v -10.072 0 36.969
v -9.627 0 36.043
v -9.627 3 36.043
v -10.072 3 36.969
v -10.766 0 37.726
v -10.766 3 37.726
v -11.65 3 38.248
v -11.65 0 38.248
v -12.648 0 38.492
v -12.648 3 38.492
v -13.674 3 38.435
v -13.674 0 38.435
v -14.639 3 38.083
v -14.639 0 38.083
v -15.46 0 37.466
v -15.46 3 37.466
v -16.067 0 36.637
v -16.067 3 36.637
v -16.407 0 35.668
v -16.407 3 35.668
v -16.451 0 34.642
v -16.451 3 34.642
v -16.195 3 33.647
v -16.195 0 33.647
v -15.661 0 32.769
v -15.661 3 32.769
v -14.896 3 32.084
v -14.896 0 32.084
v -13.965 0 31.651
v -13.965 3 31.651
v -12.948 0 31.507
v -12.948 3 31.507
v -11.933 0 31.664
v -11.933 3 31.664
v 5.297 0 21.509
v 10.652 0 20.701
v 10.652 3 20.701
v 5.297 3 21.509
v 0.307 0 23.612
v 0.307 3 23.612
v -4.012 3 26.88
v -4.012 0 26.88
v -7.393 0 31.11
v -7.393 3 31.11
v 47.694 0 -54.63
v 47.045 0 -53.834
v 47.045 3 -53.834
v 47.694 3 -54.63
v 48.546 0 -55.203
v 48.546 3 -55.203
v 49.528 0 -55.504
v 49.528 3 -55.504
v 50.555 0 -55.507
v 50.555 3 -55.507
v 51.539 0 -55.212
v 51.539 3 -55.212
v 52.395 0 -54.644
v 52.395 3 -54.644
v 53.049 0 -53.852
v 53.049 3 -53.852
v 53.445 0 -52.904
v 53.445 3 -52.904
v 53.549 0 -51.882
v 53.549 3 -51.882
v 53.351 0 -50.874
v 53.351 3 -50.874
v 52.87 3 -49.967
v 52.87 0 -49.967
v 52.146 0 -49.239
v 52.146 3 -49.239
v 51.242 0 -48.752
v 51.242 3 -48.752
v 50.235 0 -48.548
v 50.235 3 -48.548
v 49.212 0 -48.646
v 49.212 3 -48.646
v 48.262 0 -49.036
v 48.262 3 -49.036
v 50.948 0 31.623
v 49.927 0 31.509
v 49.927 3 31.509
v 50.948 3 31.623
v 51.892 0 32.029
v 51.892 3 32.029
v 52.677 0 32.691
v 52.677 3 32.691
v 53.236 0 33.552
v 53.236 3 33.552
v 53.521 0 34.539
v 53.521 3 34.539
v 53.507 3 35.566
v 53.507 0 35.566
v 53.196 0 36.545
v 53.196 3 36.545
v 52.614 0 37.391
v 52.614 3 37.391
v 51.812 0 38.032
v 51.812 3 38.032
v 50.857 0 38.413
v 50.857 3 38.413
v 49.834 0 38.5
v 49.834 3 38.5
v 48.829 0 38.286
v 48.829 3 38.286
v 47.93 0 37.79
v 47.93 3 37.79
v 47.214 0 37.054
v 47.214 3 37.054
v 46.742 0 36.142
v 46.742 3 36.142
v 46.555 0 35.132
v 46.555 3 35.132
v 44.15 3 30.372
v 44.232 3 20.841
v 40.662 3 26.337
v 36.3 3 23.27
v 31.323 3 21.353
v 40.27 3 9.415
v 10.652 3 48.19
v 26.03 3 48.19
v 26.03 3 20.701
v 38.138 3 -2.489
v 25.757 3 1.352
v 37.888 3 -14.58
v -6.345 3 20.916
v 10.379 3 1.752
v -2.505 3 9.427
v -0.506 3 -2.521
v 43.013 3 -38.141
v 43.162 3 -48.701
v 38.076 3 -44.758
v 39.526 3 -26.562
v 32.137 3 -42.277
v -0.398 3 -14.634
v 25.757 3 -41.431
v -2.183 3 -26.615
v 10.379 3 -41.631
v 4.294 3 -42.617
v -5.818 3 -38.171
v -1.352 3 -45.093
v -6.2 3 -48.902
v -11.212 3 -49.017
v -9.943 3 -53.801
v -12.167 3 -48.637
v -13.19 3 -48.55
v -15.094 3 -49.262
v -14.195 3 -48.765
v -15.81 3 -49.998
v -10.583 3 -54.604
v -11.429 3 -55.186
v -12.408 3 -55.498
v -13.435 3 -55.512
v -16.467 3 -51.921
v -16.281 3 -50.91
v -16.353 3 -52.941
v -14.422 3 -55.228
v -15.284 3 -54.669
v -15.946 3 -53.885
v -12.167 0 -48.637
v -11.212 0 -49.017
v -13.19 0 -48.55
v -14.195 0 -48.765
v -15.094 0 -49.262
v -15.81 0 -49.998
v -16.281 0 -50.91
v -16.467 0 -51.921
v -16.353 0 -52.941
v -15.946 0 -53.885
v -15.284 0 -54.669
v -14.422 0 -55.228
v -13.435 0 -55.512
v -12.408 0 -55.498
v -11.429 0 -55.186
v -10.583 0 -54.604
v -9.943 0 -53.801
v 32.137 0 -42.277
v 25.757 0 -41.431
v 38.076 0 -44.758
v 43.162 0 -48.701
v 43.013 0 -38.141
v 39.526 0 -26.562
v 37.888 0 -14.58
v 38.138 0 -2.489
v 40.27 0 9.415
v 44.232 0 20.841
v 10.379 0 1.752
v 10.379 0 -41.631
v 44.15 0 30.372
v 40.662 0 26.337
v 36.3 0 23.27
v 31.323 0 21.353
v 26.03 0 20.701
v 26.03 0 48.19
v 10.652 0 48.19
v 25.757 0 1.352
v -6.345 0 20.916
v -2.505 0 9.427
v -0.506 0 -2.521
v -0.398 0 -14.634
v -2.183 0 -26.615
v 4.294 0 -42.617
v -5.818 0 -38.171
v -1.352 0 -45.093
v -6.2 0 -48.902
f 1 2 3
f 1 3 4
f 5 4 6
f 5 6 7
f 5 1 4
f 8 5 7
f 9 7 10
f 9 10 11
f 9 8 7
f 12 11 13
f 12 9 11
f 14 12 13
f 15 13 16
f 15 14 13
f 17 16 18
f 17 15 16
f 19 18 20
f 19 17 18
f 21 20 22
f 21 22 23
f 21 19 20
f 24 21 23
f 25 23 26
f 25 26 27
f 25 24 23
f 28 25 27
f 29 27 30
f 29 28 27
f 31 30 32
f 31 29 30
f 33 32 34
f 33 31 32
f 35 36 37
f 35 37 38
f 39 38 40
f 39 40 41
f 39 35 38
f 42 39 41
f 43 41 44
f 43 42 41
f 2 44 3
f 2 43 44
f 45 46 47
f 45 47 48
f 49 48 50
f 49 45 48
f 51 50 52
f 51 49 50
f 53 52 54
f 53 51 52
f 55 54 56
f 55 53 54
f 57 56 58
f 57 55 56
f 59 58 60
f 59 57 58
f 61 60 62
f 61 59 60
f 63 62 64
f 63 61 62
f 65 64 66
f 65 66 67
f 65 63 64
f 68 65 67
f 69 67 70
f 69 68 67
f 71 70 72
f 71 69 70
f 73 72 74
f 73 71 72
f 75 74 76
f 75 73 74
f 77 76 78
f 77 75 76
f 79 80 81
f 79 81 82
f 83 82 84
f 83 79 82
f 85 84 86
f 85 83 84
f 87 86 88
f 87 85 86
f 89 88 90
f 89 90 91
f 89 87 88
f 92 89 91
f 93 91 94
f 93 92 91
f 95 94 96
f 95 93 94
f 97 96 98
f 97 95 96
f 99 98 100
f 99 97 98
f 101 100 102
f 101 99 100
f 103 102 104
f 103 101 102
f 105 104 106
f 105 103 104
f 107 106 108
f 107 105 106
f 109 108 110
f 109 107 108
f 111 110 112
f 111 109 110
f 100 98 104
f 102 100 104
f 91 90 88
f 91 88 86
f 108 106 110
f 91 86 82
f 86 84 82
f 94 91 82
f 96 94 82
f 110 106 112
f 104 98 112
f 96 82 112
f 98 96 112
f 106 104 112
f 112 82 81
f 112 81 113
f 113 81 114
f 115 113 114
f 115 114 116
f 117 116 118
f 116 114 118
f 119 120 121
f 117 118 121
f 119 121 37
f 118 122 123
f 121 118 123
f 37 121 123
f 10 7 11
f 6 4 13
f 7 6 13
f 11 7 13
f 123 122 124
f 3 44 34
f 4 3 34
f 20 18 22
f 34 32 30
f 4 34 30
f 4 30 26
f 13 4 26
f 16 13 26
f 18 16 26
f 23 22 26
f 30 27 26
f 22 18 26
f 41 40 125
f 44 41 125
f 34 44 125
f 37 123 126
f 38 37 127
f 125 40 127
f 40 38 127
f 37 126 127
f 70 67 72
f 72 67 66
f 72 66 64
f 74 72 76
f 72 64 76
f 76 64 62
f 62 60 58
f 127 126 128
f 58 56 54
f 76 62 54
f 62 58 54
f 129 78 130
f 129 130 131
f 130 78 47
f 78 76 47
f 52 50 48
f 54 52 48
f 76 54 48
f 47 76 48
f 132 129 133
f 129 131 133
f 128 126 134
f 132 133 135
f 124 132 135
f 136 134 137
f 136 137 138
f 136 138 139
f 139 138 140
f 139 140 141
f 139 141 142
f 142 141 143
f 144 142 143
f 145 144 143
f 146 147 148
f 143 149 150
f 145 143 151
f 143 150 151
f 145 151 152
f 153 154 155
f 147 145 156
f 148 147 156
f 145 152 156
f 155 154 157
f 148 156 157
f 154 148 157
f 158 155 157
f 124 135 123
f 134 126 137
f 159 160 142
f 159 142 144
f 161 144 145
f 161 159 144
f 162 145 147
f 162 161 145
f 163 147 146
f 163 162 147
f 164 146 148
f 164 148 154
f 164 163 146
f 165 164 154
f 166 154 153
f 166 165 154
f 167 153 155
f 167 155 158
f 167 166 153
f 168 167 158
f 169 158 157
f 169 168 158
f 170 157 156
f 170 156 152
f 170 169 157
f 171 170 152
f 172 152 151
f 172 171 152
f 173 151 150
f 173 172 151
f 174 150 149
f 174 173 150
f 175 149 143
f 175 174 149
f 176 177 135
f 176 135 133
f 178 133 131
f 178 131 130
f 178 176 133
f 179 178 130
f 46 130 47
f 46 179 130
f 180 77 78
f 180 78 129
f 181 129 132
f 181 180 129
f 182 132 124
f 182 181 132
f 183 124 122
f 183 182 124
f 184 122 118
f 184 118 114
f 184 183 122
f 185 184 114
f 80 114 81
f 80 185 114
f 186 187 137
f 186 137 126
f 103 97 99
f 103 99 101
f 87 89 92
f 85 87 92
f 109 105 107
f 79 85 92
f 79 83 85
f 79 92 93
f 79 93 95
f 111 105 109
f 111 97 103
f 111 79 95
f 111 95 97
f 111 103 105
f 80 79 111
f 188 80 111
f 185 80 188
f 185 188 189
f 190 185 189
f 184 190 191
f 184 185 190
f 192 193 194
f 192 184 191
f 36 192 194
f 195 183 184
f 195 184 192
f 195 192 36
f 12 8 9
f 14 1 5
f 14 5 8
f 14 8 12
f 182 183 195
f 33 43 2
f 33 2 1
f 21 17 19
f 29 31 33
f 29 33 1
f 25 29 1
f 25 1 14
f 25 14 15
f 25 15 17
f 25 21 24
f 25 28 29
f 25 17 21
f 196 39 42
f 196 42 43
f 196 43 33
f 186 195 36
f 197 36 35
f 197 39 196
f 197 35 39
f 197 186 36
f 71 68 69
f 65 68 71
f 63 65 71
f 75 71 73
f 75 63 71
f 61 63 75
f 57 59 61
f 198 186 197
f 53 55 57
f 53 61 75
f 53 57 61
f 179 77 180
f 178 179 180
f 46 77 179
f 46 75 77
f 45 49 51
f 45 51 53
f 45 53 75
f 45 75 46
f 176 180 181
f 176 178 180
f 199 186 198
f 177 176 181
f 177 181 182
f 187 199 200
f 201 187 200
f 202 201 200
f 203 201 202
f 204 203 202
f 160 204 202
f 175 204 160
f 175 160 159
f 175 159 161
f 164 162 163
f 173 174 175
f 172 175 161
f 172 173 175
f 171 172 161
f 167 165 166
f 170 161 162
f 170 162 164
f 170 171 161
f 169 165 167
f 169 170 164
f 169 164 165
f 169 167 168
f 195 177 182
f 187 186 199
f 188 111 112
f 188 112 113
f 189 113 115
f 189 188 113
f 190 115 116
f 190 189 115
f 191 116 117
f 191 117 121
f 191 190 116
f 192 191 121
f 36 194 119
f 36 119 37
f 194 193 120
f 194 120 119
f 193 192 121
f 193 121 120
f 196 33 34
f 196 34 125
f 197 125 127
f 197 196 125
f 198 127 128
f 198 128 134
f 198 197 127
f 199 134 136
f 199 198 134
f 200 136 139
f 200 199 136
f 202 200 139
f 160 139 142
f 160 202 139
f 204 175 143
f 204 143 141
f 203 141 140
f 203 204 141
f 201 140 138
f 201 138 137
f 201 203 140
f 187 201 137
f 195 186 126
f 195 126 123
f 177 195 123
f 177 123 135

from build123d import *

# Parameters (mm, degrees)
BOSS_EXTRUDE2_DEPTH = 3


with BuildPart() as part:
    # Sketch1 → Boss-Extrude2 (new body)
    with BuildSketch(Plane(origin=(0, 0, 0), x_dir=(1, 0, 0), z_dir=(0, 1, 0))):
        with BuildLine():
            Line((25.757149381, -1.351865927), (25.757149381, 41.431167148))
            ThreePointArc((25.757149381, 41.431167148), (38.075697549, 44.757926971), (47.044816732, 53.833656195))
            ThreePointArc((47.044816732, 53.833656195), (53.444849138, 52.904300859), (48.262189364, 49.035948005))
            ThreePointArc((48.262189364, 49.035948005), (37.775812363, 8.529611884), (49.927233588, -31.508748857))
            ThreePointArc((49.927233588, -31.508748857), (52.6141246, -37.391327613), (46.554594416, -35.131635139))
            ThreePointArc((46.554594416, -35.131635139), (38.575085108, -24.669898603), (26.030357143, -20.701233785))
            Line((26.030357143, -20.701233785), (26.030357143, -48.189781488))
            Line((26.030357143, -48.189781488), (10.652357143, -48.189781488))
            Line((10.652357143, -48.189781488), (10.652357143, -20.701233785))
            ThreePointArc((10.652357143, -20.701233785), (-1.954368788, -25.111263089), (-9.626768487, -36.04342573))
            ThreePointArc((-9.626768487, -36.04342573), (-16.066621017, -36.637071695), (-11.932728711, -31.663637214))
            ThreePointArc((-11.932728711, -31.663637214), (-0.214526097, 8.575081304), (-11.212333327, 49.01663143))
            ThreePointArc((-11.212333327, 49.01663143), (-16.352559443, 52.941194032), (-9.942785871, 53.800797946))
            ThreePointArc((-9.942785871, 53.800797946), (-1.352444064, 45.093210402), (10.379149381, 41.631163543))
            Line((10.379149381, 41.631163543), (10.379149381, -1.751865927))
            Line((10.379149381, -1.751865927), (25.757149381, -1.351865927))
        make_face()
    extrude(amount=BOSS_EXTRUDE2_DEPTH)


solid = part.part
